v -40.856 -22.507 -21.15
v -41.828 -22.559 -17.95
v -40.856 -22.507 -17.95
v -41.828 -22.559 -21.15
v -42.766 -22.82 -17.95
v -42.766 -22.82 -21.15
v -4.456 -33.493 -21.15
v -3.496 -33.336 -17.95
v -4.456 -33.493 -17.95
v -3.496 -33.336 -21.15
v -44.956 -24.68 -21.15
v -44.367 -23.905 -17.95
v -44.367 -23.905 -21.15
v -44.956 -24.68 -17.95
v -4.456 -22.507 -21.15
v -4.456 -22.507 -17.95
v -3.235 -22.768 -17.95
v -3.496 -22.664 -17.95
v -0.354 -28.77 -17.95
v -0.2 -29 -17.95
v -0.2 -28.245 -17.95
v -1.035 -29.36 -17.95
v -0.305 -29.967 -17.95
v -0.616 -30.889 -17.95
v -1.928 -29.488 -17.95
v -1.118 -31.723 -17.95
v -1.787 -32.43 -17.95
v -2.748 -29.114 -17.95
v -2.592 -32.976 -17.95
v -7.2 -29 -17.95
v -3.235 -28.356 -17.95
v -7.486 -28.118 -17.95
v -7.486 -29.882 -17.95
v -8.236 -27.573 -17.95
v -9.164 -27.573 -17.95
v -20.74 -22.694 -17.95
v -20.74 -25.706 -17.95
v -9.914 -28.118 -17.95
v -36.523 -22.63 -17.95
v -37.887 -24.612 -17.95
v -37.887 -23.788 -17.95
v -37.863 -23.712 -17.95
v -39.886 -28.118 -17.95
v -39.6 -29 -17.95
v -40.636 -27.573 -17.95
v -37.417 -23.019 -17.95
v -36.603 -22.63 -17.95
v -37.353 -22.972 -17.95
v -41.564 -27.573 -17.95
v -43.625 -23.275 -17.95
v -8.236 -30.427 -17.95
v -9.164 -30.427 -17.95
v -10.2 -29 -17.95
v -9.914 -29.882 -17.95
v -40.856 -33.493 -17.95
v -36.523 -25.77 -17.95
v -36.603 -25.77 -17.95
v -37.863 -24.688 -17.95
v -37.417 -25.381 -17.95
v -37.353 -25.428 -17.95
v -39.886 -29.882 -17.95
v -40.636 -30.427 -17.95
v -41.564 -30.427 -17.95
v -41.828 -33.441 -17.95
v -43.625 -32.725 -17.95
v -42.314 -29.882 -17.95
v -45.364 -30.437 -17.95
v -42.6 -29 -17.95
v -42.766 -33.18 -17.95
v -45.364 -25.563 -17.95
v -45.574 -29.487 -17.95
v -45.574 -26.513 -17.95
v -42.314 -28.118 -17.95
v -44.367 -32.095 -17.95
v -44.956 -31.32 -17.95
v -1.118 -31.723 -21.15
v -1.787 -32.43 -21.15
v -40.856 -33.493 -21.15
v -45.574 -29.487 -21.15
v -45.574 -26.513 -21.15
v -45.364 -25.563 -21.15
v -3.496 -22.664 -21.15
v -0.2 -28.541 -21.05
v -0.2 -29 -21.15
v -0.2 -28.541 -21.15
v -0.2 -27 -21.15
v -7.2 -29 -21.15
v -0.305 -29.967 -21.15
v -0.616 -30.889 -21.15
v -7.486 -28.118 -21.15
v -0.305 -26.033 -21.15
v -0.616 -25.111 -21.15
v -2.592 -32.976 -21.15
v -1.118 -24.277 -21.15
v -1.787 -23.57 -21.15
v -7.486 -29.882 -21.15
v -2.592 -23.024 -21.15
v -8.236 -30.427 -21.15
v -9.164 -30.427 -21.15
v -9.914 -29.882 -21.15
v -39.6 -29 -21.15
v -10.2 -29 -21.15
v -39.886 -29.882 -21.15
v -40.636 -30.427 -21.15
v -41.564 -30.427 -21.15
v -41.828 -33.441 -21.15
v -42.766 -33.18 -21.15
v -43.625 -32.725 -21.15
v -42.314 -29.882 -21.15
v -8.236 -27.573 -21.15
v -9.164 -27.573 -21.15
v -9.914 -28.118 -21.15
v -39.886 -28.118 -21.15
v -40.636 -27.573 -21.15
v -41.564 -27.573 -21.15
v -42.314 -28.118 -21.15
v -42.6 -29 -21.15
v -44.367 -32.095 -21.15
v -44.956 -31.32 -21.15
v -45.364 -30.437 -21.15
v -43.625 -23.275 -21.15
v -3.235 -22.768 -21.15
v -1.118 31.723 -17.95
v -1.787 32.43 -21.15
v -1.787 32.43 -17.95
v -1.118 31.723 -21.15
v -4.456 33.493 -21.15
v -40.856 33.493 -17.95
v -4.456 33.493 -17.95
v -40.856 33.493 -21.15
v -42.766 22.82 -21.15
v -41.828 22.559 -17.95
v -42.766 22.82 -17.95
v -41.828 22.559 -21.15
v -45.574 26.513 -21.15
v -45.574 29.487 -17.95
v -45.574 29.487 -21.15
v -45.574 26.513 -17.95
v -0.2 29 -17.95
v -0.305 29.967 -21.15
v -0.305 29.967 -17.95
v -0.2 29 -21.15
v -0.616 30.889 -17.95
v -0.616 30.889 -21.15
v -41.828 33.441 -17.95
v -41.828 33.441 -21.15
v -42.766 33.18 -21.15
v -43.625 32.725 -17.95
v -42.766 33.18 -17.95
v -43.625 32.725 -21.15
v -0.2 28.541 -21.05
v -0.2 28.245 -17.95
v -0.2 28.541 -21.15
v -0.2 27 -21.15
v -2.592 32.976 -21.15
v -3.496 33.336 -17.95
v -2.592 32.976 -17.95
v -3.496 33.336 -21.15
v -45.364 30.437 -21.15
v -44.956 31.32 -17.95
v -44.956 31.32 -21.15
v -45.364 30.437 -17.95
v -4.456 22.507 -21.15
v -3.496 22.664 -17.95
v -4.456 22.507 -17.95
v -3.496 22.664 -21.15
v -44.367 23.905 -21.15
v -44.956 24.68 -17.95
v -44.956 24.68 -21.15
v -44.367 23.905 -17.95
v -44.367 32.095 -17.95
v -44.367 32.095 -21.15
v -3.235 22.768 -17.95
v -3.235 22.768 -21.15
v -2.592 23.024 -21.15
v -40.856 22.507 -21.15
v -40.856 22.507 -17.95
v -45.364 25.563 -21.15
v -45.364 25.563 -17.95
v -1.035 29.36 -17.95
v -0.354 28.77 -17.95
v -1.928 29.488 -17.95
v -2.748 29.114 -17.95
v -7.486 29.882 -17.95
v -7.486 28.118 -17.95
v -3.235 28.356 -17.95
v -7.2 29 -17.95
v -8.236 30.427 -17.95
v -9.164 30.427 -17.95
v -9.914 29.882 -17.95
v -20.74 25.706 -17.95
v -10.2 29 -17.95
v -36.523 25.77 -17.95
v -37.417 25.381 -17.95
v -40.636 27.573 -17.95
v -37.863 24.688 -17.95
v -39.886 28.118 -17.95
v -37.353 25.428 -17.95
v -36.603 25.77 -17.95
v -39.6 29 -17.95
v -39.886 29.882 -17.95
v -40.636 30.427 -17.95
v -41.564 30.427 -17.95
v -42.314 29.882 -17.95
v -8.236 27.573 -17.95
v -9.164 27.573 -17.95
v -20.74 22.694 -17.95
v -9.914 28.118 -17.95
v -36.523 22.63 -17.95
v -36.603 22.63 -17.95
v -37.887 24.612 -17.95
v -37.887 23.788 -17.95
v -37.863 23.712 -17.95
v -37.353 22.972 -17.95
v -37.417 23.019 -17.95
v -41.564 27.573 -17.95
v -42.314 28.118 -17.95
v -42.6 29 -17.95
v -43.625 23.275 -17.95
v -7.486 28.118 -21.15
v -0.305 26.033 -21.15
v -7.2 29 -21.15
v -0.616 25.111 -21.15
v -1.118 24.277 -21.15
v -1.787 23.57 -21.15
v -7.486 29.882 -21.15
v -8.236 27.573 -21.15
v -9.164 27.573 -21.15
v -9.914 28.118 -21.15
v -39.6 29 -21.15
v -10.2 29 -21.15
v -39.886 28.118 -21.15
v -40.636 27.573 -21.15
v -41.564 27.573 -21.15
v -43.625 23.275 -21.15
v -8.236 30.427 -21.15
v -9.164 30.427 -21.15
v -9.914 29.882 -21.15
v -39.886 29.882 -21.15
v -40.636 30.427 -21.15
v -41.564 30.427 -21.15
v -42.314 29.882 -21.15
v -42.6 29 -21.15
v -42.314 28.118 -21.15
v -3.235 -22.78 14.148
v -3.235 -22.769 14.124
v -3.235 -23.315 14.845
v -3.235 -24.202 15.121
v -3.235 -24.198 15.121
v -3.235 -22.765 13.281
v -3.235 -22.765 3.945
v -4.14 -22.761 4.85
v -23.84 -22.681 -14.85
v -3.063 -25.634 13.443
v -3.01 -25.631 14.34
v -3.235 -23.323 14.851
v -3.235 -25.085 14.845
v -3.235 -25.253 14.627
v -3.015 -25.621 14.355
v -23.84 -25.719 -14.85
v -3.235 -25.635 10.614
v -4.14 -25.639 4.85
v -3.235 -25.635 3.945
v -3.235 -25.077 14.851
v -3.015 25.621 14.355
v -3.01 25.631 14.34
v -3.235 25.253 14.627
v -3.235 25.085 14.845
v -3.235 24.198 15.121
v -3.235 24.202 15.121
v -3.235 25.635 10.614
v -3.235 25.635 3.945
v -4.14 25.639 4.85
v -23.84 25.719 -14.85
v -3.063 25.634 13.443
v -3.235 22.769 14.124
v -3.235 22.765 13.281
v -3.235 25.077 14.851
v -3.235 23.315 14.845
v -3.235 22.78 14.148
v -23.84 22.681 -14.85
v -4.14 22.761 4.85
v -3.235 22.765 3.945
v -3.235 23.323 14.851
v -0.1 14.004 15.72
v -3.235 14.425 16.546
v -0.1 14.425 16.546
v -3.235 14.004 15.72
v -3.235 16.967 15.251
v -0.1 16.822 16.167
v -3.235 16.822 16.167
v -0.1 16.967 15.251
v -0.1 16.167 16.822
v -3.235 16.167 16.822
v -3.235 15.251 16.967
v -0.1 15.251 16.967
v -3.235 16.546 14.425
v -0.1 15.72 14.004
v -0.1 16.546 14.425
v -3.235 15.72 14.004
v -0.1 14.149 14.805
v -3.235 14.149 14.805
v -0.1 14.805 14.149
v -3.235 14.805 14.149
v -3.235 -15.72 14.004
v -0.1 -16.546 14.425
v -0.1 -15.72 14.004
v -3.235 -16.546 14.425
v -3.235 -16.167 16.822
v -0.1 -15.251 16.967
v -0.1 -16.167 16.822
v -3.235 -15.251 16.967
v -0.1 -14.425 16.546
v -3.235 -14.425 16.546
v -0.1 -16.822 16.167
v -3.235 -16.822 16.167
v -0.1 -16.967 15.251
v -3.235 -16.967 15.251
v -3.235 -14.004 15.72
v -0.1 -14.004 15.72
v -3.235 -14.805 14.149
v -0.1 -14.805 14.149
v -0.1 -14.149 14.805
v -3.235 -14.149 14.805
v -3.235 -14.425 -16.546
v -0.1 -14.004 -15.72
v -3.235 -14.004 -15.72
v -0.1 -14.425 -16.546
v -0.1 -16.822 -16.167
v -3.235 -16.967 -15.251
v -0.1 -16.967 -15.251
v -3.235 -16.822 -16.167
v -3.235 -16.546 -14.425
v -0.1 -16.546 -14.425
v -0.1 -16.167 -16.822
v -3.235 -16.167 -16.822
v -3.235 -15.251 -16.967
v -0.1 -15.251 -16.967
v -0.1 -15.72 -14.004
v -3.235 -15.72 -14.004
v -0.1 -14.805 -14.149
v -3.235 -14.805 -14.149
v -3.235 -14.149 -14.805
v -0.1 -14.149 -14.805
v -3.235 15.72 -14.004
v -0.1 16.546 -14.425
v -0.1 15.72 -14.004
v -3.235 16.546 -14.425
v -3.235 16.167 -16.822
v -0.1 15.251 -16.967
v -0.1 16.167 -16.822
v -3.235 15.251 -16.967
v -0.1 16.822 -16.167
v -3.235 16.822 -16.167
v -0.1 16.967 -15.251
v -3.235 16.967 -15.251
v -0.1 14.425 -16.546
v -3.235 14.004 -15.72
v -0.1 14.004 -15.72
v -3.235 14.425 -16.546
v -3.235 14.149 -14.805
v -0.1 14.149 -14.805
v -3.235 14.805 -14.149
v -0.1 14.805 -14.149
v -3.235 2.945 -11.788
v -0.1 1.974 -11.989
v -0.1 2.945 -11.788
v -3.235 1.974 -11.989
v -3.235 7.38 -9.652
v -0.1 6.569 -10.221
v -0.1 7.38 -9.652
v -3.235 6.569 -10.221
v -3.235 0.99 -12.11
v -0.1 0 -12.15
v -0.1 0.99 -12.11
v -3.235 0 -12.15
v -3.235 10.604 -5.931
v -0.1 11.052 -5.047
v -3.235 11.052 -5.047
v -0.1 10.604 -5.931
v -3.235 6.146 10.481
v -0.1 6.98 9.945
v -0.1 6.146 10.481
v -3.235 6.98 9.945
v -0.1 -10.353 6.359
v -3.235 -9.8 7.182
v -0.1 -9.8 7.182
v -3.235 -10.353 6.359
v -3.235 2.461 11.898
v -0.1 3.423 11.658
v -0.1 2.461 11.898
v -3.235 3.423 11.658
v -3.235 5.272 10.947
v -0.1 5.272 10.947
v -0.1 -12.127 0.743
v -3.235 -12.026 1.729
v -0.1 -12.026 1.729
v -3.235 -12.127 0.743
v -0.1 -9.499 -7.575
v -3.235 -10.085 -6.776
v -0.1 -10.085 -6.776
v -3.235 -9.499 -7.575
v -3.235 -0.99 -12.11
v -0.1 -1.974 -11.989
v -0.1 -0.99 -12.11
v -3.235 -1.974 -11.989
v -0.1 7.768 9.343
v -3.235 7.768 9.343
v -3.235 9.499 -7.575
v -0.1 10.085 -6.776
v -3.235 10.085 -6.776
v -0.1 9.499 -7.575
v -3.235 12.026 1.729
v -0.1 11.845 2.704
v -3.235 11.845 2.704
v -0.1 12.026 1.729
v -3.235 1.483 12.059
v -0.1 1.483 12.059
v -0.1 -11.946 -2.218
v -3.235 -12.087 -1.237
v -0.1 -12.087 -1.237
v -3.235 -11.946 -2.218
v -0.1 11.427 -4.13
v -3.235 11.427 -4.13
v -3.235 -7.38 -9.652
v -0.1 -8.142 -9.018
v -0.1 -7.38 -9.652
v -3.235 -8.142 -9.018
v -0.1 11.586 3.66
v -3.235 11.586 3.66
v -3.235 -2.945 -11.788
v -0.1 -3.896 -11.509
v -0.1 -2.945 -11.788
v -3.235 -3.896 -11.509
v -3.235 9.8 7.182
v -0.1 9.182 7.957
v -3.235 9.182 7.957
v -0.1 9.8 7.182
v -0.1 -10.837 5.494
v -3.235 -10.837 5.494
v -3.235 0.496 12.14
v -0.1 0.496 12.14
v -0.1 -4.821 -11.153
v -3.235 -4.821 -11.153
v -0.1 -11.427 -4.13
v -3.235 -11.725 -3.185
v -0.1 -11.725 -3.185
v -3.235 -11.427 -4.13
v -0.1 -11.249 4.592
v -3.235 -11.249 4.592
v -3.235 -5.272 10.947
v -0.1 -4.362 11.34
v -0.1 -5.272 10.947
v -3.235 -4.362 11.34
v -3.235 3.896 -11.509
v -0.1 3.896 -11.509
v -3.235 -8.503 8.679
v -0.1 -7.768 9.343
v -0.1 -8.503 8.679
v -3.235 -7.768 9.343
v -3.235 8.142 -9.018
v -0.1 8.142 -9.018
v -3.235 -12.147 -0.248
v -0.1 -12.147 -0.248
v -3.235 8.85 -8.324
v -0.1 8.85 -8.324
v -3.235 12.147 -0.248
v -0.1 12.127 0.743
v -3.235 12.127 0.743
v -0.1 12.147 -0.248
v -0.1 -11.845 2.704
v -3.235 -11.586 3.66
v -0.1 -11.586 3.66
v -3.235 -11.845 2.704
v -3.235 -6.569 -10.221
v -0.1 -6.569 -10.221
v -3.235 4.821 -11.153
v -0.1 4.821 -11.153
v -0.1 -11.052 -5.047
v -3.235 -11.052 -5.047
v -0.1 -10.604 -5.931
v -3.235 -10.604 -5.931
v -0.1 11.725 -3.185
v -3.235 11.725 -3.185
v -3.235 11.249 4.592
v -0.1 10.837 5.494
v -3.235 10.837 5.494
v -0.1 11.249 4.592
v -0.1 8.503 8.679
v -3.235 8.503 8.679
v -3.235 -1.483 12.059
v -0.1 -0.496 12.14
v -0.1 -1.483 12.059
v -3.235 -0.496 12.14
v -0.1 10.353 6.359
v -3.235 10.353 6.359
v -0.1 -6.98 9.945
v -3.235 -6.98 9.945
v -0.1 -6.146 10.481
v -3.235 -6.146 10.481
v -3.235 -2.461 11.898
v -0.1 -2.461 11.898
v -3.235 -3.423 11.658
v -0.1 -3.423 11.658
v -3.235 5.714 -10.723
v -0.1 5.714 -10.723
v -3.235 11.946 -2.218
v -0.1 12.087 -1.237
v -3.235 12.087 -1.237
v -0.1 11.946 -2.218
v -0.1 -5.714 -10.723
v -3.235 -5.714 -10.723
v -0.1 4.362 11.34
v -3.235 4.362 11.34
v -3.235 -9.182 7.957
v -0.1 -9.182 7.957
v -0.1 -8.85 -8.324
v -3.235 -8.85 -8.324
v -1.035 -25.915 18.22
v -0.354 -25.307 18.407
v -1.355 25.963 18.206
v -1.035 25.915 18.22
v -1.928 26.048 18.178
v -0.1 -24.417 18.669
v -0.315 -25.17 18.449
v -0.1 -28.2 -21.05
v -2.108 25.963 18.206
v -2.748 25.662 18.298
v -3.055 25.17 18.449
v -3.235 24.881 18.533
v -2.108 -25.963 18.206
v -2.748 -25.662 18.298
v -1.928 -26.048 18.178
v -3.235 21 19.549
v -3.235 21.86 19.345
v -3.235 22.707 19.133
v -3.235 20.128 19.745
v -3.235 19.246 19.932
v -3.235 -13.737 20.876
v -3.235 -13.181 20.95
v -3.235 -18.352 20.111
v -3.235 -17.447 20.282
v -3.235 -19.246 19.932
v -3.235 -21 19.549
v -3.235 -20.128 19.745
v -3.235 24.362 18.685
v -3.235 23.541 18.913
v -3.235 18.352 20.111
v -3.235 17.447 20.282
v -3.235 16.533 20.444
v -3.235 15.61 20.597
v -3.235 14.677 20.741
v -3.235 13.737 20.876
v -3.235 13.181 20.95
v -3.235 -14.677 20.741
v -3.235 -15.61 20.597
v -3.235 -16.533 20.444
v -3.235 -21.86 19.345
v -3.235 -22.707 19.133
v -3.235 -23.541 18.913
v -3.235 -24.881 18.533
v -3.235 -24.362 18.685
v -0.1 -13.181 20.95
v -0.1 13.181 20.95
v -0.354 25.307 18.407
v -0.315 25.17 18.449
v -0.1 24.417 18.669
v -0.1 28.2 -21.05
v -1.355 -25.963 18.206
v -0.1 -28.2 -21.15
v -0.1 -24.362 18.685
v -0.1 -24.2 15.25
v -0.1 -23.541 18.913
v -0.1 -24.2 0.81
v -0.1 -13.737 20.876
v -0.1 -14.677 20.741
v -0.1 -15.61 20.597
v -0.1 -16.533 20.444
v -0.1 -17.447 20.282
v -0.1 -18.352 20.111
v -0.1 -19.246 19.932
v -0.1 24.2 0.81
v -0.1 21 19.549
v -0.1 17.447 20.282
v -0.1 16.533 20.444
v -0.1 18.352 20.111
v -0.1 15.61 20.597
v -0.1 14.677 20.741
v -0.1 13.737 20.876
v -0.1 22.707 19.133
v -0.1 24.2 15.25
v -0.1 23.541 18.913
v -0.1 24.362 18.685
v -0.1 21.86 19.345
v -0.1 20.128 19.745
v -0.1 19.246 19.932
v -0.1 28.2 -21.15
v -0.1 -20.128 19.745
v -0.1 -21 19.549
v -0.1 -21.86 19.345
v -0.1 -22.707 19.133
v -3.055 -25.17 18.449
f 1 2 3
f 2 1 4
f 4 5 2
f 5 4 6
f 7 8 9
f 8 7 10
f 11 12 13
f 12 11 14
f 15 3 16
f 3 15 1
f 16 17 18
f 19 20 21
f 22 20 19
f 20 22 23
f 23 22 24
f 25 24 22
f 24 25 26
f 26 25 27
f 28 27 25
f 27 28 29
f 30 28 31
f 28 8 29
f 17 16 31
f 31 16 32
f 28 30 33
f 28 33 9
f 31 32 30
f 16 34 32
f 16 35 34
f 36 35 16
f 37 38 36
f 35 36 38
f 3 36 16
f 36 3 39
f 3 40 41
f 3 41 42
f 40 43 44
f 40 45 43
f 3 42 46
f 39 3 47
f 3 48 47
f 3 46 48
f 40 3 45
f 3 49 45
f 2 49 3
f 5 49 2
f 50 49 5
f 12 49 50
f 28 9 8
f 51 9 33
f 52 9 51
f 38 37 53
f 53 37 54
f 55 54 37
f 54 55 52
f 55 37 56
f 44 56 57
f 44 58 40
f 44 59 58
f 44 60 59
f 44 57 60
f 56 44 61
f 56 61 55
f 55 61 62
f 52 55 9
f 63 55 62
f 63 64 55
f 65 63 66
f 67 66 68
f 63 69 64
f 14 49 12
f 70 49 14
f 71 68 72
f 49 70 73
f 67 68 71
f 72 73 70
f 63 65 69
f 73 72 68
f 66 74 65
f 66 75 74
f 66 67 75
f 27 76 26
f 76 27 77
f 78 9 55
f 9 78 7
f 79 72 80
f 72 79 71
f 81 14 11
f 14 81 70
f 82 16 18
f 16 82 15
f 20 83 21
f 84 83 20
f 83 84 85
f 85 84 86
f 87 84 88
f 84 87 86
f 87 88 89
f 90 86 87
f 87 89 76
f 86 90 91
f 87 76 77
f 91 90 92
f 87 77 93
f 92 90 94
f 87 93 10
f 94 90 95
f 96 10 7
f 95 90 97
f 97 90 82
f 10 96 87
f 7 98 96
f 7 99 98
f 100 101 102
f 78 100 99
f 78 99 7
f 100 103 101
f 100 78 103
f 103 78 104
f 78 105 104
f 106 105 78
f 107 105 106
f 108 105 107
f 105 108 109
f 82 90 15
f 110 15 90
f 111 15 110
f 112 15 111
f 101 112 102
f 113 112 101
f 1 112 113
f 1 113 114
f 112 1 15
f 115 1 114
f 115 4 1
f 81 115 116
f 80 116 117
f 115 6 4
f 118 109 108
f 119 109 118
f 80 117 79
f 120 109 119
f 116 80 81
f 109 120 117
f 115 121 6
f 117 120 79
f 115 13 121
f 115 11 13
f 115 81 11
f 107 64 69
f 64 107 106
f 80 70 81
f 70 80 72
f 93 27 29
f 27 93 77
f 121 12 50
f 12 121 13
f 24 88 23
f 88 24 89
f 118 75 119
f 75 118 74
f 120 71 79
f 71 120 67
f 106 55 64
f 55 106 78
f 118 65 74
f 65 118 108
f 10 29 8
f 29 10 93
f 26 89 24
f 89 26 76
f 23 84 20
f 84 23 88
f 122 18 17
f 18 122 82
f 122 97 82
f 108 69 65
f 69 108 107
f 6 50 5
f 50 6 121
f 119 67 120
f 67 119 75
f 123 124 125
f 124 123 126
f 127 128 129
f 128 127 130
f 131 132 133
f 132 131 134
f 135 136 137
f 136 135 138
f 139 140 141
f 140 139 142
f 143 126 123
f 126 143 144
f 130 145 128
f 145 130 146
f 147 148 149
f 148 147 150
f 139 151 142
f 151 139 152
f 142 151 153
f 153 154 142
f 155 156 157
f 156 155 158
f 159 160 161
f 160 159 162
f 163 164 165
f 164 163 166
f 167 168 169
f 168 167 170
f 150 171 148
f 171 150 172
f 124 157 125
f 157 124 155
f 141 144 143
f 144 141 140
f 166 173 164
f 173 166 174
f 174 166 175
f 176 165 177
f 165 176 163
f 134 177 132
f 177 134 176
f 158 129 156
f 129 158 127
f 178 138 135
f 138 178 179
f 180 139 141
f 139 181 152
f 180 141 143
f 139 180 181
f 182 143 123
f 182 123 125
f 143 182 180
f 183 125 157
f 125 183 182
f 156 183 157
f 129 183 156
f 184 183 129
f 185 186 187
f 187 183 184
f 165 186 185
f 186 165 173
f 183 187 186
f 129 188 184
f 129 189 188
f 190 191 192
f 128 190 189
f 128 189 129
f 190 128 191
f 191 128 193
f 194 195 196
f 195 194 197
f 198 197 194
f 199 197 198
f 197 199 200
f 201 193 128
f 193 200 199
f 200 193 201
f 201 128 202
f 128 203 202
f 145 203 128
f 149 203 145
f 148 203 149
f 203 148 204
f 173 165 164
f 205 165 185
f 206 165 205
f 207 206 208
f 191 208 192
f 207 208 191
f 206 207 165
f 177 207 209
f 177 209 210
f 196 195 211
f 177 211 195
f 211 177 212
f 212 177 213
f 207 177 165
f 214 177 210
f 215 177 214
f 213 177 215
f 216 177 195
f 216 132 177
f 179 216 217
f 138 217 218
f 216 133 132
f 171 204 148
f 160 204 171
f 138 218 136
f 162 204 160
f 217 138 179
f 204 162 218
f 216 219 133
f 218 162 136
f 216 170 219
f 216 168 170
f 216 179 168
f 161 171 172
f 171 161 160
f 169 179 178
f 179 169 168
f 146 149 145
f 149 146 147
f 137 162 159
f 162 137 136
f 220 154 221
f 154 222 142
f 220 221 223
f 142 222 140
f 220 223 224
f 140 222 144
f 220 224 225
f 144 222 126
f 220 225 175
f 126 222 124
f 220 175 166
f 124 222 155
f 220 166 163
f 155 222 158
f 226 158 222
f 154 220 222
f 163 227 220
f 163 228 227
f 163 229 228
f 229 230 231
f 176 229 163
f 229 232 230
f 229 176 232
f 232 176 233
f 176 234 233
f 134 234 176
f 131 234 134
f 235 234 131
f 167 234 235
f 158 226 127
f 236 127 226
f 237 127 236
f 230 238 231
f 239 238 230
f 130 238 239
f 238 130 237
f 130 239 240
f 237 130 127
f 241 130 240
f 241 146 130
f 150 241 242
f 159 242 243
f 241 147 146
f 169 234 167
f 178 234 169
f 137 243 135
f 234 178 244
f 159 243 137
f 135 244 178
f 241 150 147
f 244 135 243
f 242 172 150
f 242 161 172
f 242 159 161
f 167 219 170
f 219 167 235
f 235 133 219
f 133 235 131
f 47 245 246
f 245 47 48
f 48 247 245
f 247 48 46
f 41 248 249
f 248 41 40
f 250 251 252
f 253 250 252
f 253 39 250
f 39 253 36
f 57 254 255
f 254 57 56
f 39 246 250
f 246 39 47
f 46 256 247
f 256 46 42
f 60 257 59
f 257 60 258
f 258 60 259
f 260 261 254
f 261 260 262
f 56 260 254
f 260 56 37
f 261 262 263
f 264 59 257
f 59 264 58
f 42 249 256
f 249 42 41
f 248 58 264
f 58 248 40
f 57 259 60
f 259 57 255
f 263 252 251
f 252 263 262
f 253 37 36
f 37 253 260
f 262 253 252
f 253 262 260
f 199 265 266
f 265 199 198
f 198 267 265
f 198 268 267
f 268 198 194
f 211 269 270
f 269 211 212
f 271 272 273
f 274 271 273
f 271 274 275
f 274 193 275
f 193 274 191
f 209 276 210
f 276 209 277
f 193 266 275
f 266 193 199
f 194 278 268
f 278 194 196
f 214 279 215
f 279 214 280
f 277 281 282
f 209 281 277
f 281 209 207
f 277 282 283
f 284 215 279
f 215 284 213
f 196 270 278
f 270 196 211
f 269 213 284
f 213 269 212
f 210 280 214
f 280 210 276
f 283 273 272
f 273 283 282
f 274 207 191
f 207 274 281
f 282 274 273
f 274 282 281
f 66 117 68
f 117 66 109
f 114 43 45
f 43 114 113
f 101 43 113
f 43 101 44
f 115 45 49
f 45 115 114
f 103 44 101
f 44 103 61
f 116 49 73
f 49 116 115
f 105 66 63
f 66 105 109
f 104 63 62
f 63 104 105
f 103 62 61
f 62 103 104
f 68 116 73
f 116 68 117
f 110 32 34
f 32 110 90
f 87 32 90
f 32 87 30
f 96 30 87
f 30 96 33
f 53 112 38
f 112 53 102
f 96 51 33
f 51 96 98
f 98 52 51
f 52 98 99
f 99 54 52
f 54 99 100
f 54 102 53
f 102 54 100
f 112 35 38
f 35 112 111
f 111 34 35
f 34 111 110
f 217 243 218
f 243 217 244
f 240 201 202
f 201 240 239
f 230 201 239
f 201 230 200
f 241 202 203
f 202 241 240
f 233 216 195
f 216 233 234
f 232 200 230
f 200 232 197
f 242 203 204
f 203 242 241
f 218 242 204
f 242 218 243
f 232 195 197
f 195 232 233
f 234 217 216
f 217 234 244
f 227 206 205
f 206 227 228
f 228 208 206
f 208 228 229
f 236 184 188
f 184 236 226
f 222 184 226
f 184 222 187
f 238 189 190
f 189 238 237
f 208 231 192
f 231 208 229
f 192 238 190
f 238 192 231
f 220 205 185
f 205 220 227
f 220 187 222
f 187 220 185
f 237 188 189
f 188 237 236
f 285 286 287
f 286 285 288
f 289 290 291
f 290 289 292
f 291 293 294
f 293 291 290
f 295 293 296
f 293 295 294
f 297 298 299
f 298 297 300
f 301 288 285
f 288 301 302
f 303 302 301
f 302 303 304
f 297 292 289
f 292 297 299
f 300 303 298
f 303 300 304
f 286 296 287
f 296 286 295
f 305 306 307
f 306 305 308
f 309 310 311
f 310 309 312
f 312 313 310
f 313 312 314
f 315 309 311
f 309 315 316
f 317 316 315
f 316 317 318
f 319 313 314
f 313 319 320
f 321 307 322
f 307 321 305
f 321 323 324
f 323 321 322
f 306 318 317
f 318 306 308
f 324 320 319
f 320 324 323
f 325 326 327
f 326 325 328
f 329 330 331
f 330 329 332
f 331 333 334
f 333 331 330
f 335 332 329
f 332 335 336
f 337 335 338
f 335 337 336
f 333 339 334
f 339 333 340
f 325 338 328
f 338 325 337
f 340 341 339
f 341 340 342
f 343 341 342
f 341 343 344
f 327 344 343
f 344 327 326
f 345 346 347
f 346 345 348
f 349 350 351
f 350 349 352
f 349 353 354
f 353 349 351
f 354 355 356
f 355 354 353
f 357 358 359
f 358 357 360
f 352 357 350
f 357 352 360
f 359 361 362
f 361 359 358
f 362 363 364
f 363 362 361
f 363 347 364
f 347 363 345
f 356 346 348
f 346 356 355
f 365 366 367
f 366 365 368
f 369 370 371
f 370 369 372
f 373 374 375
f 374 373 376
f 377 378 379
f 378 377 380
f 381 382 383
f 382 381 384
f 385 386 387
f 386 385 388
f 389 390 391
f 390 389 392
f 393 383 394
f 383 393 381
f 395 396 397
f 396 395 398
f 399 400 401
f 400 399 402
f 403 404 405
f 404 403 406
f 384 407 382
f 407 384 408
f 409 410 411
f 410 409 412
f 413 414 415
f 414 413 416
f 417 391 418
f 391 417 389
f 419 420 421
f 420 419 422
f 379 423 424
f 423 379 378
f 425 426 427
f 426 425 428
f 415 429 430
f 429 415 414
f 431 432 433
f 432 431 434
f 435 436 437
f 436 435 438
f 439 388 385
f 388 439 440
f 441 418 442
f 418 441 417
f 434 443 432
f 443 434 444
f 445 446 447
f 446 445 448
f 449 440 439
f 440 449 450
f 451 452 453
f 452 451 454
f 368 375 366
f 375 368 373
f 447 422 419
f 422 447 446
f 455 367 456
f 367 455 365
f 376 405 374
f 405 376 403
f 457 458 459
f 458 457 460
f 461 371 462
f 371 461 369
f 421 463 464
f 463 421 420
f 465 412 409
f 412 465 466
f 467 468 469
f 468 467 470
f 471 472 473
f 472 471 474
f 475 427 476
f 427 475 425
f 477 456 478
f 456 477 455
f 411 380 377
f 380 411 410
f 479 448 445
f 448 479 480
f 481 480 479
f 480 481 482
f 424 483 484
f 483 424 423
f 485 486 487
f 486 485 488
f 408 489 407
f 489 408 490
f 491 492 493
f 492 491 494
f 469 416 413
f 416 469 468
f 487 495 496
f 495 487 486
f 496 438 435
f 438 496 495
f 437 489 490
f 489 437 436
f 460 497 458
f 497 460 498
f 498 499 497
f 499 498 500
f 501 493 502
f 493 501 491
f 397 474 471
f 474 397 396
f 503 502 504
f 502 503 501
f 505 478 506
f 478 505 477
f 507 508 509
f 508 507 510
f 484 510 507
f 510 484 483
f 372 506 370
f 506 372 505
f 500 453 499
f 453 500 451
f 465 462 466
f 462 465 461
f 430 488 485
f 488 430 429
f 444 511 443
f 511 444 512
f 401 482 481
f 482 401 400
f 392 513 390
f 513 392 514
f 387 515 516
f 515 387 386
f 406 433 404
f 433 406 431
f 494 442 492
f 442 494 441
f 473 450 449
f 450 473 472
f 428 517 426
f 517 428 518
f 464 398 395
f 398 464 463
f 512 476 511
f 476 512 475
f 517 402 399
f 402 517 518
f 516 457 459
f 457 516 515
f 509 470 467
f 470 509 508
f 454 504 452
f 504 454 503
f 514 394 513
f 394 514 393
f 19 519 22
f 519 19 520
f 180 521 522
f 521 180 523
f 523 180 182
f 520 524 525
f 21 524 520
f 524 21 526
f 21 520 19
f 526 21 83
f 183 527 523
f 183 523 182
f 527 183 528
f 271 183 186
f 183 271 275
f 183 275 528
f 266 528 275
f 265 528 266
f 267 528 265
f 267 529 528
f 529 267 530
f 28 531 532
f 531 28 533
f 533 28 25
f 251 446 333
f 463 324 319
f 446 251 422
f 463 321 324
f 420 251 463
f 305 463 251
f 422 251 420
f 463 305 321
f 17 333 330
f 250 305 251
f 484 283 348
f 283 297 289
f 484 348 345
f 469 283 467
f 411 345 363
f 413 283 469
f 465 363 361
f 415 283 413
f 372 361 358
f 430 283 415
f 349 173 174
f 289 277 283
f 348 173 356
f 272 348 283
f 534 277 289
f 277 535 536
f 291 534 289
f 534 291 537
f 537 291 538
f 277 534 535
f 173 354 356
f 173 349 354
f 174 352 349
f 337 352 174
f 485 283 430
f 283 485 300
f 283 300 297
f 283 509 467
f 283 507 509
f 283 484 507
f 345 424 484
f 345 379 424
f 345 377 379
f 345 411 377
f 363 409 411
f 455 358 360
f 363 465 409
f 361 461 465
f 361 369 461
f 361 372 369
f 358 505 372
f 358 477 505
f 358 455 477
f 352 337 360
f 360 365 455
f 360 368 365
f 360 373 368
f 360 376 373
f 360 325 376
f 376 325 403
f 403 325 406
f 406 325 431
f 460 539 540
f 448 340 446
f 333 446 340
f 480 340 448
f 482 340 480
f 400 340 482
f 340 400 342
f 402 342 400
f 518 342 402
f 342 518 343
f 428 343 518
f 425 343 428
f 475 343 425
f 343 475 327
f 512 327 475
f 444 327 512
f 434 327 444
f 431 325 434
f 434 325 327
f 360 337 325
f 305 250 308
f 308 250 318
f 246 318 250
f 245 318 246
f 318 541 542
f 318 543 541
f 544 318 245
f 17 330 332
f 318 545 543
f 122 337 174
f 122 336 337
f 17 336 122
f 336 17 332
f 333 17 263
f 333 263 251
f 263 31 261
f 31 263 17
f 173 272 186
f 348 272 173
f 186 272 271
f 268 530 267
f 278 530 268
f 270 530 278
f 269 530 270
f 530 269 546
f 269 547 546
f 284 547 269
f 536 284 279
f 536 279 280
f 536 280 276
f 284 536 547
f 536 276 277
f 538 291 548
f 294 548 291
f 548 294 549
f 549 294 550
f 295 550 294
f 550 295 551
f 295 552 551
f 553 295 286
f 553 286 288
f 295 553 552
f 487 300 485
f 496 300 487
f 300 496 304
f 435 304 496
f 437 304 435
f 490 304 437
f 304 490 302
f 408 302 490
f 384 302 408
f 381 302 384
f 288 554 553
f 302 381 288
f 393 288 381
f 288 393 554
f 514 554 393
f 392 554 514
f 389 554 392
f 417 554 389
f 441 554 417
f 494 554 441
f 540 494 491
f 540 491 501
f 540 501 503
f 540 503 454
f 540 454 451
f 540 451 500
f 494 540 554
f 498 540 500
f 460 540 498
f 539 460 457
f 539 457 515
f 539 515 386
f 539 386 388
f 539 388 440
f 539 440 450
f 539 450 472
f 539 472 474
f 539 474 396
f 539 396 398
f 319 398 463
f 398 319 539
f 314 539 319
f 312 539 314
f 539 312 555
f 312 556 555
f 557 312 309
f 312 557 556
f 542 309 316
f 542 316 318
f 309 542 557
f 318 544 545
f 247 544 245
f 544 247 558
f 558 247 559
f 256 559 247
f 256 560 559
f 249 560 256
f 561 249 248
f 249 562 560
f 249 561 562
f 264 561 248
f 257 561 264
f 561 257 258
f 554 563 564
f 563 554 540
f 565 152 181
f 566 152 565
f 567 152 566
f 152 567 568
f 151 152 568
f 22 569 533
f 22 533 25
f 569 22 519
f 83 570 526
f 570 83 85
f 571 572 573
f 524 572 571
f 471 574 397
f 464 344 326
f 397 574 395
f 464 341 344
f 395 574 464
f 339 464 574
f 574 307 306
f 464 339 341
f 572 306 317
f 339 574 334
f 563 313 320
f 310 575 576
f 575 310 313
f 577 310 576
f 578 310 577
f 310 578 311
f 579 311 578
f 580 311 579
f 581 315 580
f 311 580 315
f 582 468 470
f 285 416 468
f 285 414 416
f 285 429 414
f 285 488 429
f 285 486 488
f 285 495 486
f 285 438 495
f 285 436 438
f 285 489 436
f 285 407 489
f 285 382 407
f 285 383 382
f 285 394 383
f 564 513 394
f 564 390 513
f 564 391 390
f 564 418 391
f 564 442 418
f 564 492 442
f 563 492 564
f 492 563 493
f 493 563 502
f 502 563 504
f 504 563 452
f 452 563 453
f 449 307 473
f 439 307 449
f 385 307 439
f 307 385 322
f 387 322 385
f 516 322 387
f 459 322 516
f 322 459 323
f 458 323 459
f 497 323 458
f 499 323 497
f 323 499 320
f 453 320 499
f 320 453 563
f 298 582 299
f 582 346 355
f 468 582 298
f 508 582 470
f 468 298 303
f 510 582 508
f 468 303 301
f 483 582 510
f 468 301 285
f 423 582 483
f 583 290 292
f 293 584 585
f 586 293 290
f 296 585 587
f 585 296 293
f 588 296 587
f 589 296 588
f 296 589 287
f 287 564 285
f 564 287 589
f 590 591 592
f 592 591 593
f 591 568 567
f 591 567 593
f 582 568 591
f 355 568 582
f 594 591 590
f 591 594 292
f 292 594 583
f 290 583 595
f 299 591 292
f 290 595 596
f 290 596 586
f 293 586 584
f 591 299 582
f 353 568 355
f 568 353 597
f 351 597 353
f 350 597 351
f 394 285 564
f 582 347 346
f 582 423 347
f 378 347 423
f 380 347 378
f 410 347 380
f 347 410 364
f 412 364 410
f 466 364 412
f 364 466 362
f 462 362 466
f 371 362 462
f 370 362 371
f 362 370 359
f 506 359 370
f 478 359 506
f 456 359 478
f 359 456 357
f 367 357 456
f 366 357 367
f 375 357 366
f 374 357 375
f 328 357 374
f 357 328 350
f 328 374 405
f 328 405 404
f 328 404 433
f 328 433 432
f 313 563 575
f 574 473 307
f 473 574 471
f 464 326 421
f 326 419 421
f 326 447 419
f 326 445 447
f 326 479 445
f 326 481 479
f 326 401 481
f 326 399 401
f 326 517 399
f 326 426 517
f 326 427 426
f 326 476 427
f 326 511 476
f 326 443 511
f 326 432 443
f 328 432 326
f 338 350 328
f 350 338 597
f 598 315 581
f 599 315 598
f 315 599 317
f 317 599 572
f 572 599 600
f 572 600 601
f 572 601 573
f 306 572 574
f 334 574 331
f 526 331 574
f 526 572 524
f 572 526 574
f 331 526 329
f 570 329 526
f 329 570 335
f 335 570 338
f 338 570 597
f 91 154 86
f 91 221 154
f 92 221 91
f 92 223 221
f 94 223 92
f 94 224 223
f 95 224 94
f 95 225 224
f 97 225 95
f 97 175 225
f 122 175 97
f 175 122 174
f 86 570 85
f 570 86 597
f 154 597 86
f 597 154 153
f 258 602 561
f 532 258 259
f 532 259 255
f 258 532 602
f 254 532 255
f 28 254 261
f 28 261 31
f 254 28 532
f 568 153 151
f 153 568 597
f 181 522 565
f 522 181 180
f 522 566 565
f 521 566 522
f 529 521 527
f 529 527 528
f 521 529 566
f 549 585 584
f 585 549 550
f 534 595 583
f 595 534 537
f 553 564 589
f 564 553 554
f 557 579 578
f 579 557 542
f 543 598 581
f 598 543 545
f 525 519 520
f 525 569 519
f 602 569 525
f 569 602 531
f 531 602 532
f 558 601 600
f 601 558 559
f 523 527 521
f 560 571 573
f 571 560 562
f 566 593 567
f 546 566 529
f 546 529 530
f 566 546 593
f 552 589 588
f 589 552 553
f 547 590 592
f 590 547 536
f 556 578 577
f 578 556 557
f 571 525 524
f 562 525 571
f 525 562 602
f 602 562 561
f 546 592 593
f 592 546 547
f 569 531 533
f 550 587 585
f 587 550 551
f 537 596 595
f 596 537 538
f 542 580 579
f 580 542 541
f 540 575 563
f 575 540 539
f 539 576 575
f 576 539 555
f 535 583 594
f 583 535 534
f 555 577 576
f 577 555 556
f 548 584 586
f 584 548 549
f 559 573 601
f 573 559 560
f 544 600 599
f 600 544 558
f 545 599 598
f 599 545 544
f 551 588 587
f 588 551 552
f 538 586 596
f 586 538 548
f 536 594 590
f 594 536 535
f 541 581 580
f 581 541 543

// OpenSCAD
//============================================================================== MOTOR PLATE



module extruder_mount()
{
	tol=0.1;
	$fa=0.1;
	$fs=1;


	csth= 3.2; // wall and bottom thickness
	csm= 3; // margin around plate holes

	space_below_stepper= 0.15; //-// csth+0.15

	motor_side= 42;
	motor_axis_z= csth + motor_side/2;

	motor_shaft_d= 5 - 0.2;
	m3_d= 3;

	motor_height= 35.4;
	motor_diag_screws= 46.5 - 2.7;

	plate_len= motor_height + 4;
	arm_reduced_h= 3;


	module tolz()
	{
		translate([0,0,-tol]) child(0);
	}


	module debug_motor()
	{
		%translate([-1,-motor_side/2,space_below_stepper])
		{
			cube([motor_height, motor_side, motor_side]);
			translate([0,motor_side/2,motor_side/2]) rotate([0,90,0]) cylinder(r=motor_shaft_d/2,h=80);
		}
	}

	module base_holes(inner_delta_x=0, inner_delta_y=0)
	{
		for(y=[-1,+1])
			for(x=[-1,+1])
				translate([x*(plate_len/2 - csm/2 - inner_delta_x-2) - 2,y*(29 - inner_delta_y),0])
					for (a = [0:$children-1]) child(a);
	}

	module motor_walls()
	{
		for(y=[-1,+1])
			translate([-plate_len/2,y*(motor_side/2 + csth),0])
					translate([arm_reduced_h,0,0])
				difference()
				{
					hull()
					{
						cylinder(r=csth/2, h=tol);
						translate([plate_len+csth/2-arm_reduced_h,0,0]) cylinder(r=csth/2 - 0.1, h=plate_len-arm_reduced_h);
					}
					// lateral holes
					translate([plate_len*0.9,-tol,motor_side*0.15]) rotate([-90,0,0]) cylinder(r=plate_len*0.5,h=csth+4*tol,center=true, $fn=4);
				}
	}

	translate([-plate_len/2 - csth, 0, -motor_side/2 - space_below_stepper]) // centered the view on the motor shaft
	{

		// Bottom
		difference()
		{
			union()
			{
				//-// hull() base_holes() cylinder(r=m3_d/2+csm,h=csth);
				for(y=[-1,+1])
					hull()
						for(x=[-1,+1])
							translate([x*(plate_len/2 - csm/2),y*(29),0])
								for (a = [0:$children-1]) { cylinder(r=m3_d/2+csm,h=csth); translate([0,-y*2,0]) cylinder(r=m3_d/2+csm,h=csth); }

				motor_walls();
			}
			// Remove screw holes
			base_holes() tolz() cylinder(r=m3_d/2,h=csth+2*tol);
			// And remove the central hole in the floor (faster print)
			//-//		hull() base_holes(inner_delta_x=8, inner_delta_y=11.8) tolz() cylinder(r=m3_d/2+csm,h=csth+2*tol);
		}

		// Mounting wall
		translate([plate_len/2+csm/2,0,0])
			intersection()
			{
				// Front wall
				translate([0,0,space_below_stepper])
				difference()
				{
					difference()
					{
						// Front wall between the two outer columns
						hull()
							for(y=[-1,+1])
								translate([0, y*(motor_side/2 + csth ), -space_below_stepper])
									hull()
									{
										translate([0,y*4,0]) cylinder(r=csth/2, h=tol); // corners
										translate([0, 0, motor_side]) cylinder(r=csth/2, h=tol);
									}
						translate([0,0,motor_side/2])
						{
							// Motor axis shoulder
							rotate([0,90,0]) cylinder(r=22.3/2+1,h= csth+2*tol, center=true);
							// Motor holes
							for(r=[0:90:359])
								rotate([0,90,0])
									rotate([0,0,r+45])
										translate([0,motor_diag_screws/2,0])
											cylinder(r=m3_d/2, h=csth*2+2*tol, center=true);
						}
					}
				}
				union() // cosmetic round top :p
				{
					hull() for(z=[0,26]) translate([-csth,0,z+space_below_stepper]) scale([1,1,0.4]) rotate([0,90,0]) cylinder(r=motor_side, h=csth*3);
				}
			}

		%translate([-plate_len/2,0,0]) debug_motor();
	}

}

//============================================================================== ALL COMPONENTS

extruder_mount();
